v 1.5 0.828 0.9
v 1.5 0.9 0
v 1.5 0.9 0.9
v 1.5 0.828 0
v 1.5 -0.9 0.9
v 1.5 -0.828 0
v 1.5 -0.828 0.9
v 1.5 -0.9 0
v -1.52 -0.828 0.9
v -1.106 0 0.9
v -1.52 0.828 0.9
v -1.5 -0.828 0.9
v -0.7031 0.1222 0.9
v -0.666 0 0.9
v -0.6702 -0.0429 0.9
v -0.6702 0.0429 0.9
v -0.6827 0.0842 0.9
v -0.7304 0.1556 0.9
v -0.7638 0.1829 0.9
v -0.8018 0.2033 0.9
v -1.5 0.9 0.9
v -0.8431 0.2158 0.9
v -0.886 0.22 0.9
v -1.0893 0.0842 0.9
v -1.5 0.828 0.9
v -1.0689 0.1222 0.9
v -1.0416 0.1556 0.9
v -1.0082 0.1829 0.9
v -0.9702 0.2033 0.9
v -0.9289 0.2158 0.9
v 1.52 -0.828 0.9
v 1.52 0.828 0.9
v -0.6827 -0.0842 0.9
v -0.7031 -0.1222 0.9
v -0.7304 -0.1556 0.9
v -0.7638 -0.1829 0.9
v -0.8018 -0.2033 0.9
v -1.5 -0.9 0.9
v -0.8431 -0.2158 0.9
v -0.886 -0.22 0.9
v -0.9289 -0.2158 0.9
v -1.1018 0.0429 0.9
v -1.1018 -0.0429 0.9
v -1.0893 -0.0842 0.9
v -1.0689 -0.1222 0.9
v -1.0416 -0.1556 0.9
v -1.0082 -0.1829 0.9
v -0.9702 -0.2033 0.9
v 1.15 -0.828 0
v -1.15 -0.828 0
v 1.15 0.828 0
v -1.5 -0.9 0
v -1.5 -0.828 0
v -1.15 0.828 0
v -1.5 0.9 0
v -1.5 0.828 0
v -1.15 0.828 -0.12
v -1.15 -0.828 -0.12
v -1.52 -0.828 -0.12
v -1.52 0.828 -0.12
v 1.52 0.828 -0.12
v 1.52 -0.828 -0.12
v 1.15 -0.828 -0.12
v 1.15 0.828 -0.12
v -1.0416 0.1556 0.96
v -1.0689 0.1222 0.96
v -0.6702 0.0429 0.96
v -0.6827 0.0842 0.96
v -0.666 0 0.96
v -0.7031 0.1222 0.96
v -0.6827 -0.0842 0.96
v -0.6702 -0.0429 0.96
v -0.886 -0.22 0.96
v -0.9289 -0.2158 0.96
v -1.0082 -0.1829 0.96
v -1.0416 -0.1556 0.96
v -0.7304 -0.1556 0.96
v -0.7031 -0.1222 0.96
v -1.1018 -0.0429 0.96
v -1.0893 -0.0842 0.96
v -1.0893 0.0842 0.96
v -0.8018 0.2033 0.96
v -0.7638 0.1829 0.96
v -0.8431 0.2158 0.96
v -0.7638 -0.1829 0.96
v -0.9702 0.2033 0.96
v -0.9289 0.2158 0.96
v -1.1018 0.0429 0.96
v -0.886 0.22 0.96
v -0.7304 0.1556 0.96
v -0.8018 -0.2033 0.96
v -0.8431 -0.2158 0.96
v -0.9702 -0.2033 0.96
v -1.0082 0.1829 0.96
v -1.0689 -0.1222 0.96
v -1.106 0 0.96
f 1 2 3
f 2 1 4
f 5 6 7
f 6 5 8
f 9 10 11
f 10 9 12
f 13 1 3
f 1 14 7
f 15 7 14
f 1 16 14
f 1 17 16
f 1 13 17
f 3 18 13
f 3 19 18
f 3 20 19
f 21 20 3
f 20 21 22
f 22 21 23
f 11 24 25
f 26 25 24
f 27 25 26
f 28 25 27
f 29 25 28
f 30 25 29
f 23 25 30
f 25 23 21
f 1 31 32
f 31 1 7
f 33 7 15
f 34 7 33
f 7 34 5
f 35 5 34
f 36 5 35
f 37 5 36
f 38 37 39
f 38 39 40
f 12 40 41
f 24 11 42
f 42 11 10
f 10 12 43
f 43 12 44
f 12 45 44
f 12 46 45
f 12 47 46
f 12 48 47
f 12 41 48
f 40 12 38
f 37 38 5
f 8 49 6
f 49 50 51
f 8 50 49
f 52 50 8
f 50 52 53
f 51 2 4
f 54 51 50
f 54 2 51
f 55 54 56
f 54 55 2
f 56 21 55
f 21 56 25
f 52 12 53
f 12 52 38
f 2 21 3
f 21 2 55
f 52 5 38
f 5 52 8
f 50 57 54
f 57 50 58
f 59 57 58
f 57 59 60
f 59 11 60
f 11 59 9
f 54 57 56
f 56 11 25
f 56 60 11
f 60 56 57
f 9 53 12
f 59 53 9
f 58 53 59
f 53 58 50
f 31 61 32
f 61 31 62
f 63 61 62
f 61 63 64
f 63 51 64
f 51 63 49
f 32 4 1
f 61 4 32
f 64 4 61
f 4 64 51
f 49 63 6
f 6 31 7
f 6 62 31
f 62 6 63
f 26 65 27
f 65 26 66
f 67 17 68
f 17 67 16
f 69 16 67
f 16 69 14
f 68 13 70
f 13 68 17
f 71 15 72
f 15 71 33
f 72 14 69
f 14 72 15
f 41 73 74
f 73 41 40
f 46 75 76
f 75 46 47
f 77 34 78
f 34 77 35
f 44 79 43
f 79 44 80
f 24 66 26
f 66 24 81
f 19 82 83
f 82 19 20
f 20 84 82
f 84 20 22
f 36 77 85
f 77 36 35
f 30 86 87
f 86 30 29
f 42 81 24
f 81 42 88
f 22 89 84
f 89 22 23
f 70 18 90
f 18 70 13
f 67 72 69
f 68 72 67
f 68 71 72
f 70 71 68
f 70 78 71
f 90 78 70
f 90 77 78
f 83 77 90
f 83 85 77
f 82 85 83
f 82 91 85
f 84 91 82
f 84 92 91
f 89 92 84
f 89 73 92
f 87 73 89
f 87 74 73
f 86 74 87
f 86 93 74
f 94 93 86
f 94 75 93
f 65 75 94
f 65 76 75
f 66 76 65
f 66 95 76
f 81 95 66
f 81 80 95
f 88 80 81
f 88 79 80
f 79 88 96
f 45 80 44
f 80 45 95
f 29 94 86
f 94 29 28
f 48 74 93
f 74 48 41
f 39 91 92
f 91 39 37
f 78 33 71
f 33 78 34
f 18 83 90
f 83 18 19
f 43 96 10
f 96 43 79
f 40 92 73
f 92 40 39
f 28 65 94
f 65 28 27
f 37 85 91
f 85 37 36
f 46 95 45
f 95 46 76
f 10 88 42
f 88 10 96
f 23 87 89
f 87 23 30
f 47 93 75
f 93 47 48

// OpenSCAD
// SMD package: 3.0 x 1.8 x 0.9 mm
// One connected solid with simple metal end terminations and a small top polarity mark.

module smd_package(A=[3.0, 1.8, 0.9]) {
    L = A[0];
    W = A[1];
    H = A[2];

    // Termination geometry (kept within overall length)
    term_len = 0.35;                 // length of each metal end
    term_thk = 0.12;                 // thickness below body
    term_w   = W * 0.92;             // slightly inset from sides
    overlap  = 0.02;                 // small overlap to guarantee manifold union

    // Polarity mark (small shallow bump on top near one end)
    mark_r = 0.22;
    mark_h = 0.06;

    union() {
        // Main body centered at origin
        translate([-L/2, -W/2, 0])
            cube([L, W, H], center=false);

        // Metal terminations (wrap to bottom and slightly up the sides)
        // Left termination
        translate([-L/2 - overlap, -term_w/2, -term_thk])
            cube([term_len + overlap, term_w, H + term_thk], center=false);

        // Right termination
        translate([L/2 - term_len, -term_w/2, -term_thk])
            cube([term_len + overlap, term_w, H + term_thk], center=false);

        // Polarity mark on top near left end
        translate([-L/2 + term_len + mark_r*1.2, 0, H - overlap])
            cylinder(h=mark_h + overlap, r=mark_r, center=false, $fn=32);
    }
}

smd_package([3.0, 1.8, 0.9]);
